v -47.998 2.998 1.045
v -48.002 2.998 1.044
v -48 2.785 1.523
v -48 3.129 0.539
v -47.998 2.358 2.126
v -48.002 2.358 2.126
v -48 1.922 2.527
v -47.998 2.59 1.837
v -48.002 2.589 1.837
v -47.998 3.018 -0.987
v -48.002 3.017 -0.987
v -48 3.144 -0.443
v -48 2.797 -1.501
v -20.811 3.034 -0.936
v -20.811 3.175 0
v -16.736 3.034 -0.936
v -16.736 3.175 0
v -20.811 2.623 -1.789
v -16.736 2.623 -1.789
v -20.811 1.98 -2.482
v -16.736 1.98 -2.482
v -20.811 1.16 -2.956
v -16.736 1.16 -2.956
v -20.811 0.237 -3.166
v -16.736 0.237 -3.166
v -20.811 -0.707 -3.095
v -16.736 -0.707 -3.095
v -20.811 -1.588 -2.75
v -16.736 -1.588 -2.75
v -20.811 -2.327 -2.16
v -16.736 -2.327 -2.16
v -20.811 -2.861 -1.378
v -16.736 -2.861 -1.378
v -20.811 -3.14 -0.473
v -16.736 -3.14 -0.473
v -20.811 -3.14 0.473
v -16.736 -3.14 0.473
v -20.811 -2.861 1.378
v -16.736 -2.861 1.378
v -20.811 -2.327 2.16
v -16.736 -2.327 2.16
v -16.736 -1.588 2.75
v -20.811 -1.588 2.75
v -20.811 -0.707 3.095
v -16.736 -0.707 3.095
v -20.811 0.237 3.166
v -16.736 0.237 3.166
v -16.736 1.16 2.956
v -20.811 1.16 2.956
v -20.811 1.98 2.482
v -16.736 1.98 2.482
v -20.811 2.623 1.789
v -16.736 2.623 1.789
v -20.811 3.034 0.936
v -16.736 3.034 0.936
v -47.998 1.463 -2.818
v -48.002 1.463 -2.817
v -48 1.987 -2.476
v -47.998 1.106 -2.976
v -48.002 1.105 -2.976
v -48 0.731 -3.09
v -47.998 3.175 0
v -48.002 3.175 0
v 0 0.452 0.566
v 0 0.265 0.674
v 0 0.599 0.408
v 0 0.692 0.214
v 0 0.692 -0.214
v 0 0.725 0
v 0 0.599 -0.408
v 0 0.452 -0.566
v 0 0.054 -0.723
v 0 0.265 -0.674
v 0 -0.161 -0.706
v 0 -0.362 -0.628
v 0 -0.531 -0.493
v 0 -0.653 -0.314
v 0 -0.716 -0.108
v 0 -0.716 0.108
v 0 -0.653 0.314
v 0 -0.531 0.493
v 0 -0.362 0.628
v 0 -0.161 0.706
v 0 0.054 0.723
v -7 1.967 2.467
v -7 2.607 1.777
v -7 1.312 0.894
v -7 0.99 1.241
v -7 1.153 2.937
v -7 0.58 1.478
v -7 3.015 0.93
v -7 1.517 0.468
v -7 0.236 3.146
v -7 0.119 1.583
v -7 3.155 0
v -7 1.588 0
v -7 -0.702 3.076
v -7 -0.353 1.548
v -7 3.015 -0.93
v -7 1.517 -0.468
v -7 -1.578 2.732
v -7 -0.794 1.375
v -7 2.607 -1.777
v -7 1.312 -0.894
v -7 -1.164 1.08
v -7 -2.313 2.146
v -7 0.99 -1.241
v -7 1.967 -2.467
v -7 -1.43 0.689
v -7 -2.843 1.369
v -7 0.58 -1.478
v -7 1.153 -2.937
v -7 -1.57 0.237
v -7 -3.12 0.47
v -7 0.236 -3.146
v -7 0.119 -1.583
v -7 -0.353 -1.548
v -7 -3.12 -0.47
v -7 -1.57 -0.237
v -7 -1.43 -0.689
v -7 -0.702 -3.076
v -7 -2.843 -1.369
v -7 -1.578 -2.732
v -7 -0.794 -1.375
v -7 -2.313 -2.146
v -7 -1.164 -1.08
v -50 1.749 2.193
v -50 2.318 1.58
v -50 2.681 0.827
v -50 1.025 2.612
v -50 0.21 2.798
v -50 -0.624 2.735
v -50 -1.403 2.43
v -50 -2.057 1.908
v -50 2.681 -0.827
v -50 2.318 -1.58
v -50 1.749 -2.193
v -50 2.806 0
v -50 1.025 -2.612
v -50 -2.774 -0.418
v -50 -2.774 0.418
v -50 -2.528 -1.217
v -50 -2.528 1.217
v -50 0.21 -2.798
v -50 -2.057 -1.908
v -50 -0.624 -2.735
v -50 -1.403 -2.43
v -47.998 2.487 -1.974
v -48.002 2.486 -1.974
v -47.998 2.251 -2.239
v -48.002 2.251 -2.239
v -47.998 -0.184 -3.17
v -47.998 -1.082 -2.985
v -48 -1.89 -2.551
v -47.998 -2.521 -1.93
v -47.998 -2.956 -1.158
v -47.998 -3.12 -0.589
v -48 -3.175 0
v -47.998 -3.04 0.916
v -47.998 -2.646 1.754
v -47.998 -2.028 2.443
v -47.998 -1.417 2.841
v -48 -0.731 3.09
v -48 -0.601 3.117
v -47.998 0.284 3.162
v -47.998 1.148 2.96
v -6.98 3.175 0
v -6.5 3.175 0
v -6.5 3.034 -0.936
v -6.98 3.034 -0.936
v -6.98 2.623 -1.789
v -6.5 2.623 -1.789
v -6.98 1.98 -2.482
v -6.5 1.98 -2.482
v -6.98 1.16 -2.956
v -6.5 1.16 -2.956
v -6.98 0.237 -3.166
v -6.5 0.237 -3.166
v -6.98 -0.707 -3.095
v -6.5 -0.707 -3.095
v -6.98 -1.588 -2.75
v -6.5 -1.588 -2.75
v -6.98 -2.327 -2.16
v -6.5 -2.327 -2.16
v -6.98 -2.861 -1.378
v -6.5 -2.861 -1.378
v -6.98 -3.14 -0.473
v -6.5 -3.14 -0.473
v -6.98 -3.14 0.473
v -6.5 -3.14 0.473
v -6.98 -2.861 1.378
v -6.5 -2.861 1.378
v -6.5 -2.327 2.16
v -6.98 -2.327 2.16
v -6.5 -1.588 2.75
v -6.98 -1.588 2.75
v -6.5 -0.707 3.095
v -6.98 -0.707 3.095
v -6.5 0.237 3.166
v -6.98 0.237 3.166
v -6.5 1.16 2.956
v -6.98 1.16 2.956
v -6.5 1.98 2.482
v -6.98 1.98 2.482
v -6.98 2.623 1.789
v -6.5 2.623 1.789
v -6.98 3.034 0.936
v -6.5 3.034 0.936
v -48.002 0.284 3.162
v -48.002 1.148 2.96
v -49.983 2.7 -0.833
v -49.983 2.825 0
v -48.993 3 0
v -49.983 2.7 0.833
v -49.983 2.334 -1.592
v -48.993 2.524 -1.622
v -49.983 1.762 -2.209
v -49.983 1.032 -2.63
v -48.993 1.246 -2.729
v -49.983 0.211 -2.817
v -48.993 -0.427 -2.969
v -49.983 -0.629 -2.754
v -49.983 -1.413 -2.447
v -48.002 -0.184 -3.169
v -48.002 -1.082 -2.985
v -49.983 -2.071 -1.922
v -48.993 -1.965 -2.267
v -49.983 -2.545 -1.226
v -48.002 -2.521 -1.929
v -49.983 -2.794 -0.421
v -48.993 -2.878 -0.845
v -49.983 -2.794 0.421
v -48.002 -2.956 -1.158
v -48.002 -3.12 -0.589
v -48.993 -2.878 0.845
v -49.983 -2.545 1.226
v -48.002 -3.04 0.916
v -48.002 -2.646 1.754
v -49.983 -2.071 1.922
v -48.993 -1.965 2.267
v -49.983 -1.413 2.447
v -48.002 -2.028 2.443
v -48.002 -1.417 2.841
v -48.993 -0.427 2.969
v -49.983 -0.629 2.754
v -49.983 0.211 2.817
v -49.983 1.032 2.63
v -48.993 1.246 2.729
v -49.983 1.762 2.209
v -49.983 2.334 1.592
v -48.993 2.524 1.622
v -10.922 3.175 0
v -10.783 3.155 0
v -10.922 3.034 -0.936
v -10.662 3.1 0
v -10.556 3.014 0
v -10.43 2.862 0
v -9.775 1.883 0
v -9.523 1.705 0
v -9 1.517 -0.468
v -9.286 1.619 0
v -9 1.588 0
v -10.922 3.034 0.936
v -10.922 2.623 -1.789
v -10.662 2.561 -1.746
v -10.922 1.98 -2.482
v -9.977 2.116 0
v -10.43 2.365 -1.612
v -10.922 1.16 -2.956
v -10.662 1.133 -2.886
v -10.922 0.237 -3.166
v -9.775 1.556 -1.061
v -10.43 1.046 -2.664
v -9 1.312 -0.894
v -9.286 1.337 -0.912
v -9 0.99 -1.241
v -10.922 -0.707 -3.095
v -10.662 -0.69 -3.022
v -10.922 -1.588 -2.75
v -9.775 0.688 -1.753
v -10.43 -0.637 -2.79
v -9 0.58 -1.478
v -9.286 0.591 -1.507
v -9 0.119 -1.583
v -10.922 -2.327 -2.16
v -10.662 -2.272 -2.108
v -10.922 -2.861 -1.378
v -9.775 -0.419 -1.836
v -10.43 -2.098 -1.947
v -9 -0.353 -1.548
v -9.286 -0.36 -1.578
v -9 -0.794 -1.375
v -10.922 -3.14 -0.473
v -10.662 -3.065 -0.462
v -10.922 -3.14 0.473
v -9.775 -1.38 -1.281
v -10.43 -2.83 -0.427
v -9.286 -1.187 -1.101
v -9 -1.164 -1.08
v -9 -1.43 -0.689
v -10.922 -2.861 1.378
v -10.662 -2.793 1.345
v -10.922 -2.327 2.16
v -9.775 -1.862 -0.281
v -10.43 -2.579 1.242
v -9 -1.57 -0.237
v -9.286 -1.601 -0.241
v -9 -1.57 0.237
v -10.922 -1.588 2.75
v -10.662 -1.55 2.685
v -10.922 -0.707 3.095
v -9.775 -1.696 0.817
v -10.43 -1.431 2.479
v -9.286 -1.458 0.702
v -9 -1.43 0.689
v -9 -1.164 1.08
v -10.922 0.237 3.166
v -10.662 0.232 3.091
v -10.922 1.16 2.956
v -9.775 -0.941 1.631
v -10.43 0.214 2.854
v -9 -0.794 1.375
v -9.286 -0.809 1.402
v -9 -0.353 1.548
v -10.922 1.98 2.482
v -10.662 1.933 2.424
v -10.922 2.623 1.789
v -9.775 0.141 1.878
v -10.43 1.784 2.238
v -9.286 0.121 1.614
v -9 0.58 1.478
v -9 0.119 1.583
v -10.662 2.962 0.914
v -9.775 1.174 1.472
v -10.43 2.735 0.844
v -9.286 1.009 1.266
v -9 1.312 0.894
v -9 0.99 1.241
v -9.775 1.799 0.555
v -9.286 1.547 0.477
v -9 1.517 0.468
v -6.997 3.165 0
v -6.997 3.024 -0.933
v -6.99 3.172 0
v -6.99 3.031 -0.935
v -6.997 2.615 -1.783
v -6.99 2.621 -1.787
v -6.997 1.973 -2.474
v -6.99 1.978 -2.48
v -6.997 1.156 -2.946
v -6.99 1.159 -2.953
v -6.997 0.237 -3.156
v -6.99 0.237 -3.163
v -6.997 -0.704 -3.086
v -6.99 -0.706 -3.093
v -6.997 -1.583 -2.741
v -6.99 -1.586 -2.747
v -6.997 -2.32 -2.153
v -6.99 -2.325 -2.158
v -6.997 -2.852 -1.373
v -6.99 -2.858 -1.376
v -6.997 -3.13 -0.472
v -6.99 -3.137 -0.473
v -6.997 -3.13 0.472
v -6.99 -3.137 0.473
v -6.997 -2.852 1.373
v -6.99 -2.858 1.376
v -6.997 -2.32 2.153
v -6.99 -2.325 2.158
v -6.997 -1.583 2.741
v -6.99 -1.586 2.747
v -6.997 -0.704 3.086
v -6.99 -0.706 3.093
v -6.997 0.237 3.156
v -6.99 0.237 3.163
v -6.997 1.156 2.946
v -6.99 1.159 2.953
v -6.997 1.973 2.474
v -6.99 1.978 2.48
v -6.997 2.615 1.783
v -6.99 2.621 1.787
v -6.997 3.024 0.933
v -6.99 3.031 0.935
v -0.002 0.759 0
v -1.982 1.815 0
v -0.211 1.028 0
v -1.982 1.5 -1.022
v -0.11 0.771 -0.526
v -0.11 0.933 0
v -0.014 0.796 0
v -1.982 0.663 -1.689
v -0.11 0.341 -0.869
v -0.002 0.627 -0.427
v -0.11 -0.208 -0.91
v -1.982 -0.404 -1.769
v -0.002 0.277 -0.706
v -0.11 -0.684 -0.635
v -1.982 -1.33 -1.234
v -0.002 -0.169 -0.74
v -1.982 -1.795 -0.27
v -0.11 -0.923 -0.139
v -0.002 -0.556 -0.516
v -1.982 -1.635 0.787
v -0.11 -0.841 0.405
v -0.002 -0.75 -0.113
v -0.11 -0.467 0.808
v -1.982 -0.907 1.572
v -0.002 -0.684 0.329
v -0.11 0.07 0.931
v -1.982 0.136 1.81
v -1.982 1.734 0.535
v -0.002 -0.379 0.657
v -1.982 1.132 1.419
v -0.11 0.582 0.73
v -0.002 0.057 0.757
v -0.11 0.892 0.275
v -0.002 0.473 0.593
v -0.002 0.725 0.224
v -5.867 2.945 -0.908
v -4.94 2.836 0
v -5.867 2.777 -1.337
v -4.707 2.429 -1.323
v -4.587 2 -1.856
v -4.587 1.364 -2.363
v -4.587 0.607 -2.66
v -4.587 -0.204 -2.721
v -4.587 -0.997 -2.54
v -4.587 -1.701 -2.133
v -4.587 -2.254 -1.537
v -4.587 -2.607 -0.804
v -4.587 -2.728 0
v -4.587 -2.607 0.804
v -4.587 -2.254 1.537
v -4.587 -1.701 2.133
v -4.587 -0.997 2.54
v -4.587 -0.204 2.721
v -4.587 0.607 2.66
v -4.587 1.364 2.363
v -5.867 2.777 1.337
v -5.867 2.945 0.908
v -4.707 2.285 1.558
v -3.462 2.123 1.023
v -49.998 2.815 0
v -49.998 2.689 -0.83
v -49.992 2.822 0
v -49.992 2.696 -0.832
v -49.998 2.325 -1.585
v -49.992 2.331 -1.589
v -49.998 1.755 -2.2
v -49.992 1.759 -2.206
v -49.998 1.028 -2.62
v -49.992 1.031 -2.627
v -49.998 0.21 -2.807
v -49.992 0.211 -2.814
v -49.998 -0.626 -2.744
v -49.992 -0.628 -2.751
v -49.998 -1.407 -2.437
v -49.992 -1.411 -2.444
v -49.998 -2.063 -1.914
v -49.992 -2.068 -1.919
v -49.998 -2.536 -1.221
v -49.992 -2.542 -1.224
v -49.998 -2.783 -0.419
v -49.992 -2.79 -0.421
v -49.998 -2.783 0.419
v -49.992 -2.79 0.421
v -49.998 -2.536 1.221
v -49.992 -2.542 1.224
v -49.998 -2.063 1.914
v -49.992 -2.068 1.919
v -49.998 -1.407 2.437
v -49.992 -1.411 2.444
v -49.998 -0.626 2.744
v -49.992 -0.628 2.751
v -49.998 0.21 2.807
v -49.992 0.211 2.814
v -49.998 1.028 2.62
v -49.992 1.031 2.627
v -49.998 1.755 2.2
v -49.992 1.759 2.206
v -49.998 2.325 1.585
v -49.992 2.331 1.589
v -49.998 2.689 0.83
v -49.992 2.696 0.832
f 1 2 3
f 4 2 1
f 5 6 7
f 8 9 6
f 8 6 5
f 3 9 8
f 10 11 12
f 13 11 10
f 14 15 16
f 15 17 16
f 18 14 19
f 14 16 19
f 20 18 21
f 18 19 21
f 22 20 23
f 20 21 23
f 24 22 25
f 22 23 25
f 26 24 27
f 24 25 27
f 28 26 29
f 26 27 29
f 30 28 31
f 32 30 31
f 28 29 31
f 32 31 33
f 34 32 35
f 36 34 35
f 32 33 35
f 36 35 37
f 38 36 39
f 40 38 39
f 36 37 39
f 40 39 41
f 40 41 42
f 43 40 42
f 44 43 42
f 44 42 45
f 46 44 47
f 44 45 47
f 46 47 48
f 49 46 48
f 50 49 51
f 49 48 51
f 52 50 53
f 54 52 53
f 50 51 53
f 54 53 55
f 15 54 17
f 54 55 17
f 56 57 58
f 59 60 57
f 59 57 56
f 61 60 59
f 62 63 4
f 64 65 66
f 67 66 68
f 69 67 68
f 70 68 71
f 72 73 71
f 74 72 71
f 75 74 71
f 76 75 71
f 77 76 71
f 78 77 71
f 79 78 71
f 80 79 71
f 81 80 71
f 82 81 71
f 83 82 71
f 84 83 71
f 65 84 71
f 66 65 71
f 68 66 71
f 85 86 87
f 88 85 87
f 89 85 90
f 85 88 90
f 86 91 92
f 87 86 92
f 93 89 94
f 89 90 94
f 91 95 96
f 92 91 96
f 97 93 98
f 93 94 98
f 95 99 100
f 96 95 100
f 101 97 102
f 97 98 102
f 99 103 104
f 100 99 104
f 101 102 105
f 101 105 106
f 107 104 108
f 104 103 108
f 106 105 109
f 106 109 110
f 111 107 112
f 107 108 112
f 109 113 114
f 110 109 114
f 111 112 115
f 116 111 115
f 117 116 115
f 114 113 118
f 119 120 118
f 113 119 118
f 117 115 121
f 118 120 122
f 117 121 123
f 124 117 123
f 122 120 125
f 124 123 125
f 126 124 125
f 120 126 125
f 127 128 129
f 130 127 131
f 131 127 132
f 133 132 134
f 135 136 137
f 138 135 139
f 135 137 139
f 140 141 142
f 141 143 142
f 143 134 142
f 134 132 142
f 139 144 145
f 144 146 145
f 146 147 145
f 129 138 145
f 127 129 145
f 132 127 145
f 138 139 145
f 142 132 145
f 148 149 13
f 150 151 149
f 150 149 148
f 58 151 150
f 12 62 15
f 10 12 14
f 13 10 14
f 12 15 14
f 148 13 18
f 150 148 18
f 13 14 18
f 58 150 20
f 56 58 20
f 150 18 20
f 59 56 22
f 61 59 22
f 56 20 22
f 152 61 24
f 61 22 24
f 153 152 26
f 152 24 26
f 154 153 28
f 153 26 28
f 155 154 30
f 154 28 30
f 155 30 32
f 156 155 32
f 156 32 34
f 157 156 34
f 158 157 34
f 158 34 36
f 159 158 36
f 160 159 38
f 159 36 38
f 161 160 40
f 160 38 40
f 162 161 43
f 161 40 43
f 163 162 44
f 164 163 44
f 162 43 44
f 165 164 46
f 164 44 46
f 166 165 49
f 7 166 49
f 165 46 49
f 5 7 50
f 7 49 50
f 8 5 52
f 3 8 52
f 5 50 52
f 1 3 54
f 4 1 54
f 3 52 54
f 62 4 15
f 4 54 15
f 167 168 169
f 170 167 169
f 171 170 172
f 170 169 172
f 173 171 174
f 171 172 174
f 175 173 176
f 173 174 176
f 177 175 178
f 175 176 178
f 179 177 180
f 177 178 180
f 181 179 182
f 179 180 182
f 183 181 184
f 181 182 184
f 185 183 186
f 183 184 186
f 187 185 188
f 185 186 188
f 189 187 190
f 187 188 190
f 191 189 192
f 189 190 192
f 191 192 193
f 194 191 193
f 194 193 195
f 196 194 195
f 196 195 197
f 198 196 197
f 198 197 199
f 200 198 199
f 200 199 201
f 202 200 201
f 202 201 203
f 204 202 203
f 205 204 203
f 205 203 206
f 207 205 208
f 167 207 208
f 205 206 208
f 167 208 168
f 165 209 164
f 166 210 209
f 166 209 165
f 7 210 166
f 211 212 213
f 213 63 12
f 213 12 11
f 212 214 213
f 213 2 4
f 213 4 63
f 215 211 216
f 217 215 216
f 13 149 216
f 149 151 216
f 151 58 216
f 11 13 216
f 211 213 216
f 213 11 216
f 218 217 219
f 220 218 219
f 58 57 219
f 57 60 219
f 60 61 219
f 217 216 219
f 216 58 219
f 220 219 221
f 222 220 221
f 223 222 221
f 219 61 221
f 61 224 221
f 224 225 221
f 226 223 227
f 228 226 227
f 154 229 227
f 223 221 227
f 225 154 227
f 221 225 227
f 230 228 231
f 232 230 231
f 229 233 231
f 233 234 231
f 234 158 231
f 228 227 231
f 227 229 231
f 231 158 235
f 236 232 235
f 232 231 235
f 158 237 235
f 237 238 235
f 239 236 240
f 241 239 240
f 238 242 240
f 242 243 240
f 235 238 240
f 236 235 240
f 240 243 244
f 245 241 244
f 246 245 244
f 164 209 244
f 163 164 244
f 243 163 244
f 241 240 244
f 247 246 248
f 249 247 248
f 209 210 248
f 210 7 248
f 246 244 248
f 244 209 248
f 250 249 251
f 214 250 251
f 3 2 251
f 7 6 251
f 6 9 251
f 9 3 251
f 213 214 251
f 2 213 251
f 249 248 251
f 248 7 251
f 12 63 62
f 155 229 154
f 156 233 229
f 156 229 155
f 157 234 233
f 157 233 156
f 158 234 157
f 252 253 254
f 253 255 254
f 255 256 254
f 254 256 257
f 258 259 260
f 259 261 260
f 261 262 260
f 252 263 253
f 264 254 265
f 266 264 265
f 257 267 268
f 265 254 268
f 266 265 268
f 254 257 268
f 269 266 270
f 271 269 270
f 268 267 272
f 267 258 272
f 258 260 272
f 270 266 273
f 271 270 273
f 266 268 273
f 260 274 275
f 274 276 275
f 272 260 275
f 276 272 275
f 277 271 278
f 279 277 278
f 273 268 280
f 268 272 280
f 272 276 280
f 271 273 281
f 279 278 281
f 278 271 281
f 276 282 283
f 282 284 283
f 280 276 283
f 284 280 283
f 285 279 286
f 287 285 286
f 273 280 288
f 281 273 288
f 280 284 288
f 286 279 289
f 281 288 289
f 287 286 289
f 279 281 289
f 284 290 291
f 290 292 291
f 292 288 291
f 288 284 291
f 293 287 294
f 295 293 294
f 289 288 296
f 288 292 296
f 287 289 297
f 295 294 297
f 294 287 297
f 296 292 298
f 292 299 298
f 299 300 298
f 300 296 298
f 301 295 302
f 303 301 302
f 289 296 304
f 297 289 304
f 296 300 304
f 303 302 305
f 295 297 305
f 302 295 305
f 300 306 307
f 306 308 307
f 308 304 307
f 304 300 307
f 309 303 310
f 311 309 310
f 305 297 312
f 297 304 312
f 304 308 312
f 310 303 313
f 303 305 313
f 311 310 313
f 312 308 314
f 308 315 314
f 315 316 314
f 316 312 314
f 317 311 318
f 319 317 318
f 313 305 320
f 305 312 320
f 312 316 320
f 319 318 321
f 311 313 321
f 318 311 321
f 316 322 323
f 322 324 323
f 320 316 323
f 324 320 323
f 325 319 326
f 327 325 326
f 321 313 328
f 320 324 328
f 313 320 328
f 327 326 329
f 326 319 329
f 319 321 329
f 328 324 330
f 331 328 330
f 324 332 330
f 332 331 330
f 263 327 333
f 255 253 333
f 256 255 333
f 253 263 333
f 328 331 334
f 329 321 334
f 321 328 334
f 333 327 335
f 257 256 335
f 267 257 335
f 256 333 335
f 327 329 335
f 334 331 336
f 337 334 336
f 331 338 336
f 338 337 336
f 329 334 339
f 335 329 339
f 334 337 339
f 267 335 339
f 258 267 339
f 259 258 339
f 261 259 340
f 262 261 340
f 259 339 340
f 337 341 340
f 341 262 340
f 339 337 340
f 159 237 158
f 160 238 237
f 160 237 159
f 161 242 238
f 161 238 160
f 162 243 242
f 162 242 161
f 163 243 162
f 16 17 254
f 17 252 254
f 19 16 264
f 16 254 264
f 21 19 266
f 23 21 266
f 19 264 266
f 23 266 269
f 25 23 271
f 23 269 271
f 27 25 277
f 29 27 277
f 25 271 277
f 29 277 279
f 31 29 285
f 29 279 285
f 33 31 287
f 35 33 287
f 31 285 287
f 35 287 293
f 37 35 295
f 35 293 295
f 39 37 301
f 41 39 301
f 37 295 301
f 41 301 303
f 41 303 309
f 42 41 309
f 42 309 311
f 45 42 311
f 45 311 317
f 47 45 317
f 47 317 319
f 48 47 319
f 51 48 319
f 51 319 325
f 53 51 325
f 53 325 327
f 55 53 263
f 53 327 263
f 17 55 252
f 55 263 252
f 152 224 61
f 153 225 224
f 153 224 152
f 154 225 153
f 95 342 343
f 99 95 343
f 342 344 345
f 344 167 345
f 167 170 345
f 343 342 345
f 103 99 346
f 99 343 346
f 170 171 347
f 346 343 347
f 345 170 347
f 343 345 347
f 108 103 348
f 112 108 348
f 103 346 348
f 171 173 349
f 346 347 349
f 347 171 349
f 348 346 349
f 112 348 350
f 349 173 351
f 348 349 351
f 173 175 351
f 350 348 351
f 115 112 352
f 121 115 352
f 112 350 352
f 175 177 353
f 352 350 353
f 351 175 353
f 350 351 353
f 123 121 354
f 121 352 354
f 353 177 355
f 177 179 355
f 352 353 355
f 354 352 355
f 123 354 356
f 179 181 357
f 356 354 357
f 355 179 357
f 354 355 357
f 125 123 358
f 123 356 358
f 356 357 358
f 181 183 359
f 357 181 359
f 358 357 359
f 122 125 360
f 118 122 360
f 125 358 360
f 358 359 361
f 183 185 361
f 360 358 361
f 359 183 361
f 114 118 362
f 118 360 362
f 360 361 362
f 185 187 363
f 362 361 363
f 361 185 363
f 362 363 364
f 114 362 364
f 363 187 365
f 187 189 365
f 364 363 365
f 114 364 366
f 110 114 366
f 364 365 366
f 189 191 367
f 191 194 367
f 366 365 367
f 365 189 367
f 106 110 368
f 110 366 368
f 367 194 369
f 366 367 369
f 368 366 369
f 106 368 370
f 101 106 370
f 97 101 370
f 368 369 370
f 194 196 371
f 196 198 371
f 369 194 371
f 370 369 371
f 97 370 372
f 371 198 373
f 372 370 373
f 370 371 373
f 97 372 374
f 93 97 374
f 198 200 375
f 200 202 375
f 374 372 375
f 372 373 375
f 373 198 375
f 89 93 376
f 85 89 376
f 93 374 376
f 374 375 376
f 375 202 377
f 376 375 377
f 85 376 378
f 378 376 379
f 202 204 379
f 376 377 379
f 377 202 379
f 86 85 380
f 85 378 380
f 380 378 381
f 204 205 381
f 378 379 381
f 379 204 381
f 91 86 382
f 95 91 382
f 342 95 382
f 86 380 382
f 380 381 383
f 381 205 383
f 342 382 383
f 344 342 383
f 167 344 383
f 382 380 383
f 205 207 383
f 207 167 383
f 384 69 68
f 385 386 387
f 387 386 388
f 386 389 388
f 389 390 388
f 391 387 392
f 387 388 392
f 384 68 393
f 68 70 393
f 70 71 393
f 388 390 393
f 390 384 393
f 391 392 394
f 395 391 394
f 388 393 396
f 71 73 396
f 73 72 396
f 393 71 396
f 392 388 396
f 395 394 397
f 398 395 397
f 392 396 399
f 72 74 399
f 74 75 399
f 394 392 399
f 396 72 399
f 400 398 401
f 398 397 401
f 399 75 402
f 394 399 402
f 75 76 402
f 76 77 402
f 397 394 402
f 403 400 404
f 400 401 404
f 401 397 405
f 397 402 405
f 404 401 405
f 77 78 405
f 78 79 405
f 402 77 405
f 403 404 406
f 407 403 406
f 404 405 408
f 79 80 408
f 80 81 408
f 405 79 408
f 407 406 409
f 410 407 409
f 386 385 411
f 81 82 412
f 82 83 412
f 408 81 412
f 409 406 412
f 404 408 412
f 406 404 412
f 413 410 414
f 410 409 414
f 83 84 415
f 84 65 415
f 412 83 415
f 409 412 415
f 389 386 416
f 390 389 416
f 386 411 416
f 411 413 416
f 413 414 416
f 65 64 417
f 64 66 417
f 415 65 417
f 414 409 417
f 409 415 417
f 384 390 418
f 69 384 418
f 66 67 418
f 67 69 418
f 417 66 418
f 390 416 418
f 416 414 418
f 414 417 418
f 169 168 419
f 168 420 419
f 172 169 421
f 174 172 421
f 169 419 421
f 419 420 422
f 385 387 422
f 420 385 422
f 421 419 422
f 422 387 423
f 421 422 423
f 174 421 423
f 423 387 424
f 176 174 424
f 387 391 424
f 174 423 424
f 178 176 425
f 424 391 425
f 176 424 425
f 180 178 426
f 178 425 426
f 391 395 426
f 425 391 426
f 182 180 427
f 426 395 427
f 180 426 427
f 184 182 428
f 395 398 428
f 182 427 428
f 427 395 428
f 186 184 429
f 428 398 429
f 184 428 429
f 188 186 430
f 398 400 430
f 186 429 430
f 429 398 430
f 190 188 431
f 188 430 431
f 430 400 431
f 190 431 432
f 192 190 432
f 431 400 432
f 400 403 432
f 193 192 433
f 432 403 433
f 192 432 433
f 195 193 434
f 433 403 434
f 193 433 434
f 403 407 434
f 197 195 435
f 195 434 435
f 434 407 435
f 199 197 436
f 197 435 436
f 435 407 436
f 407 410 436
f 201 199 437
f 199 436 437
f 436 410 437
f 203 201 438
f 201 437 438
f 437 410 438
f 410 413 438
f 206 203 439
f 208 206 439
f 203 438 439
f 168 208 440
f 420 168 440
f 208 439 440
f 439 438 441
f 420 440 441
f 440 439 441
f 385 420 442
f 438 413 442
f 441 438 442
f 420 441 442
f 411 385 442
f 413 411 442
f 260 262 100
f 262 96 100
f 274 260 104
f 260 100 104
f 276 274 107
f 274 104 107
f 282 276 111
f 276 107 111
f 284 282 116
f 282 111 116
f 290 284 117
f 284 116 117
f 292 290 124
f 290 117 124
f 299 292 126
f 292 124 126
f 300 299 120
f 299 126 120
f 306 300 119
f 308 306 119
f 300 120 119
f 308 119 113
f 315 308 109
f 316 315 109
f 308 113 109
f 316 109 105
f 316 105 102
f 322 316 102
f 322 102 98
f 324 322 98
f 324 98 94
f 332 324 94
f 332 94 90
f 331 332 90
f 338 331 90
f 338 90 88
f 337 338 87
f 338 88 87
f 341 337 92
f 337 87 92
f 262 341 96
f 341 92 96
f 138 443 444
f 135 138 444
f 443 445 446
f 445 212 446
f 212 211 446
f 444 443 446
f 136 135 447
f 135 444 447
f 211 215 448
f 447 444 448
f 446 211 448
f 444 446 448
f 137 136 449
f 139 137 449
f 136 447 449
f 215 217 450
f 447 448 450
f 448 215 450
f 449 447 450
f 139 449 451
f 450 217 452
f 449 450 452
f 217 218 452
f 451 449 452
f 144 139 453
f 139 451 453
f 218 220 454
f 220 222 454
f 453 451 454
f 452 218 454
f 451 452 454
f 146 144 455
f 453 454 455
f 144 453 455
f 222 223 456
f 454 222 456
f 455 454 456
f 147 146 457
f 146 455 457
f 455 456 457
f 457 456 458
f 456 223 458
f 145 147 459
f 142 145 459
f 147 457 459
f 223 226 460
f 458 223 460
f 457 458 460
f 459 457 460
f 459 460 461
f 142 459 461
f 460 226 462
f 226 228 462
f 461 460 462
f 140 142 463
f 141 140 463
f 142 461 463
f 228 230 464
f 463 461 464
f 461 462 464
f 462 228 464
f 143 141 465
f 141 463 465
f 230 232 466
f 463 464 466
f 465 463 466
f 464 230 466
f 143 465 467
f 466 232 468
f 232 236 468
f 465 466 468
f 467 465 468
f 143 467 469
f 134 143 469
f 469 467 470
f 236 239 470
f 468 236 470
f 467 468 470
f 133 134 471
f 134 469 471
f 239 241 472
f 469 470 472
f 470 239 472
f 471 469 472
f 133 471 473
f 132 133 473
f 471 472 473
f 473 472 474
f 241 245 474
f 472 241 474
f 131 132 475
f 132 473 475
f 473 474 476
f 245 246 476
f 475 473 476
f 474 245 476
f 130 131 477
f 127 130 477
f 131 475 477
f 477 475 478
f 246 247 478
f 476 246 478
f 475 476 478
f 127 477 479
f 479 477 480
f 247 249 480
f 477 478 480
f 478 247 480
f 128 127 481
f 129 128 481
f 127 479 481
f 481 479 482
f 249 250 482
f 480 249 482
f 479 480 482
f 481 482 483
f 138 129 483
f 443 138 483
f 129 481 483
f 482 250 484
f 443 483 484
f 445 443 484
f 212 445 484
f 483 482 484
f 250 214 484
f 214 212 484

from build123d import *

# Parameters (mm, degrees)
BREAK_EDGES_R = 0.02


with BuildPart() as part:
    # body_sketch → body (revolve)
    with BuildSketch(Plane.XY):
        with BuildLine():
            Line((-16.73571407, 3.175), (-10.921788615, 3.175))
            add(Edge.make_bspline(
                [(-10.921788615, 3.175), (-10.165447426, 3.175), (-10.250040485, 1.5875), (-9, 1.5875)],
                knots=[0, 0, 0, 0, 1, 1, 1, 1], degree=3))
            Line((-9, 1.5875), (-7, 1.5875))
            Line((-7, 1.5875), (-7, 3.175))
            Line((-7, 3.175), (-6.5, 3.175))
            add(Edge.make_bspline(
                [(-6.5, 3.175), (-5.484084378, 3.175), (-0.421041724, 1.302274259), (-0.009654297, 0.817143972), (0, 0.774017781), (0, 0.724579725)],
                knots=[0, 0, 0, 0, 0.586137631, 0.686137631, 1, 1, 1, 1], degree=3))
            Line((0, 0.724579725), (0, 0))
            Line((0, 0), (-50, 0))
            Line((-50, 0), (-50, 2.822346039))
            Line((-50, 2.822346039), (-48, 3.175))
            Line((-48, 3.175), (-20.811079947, 3.175))
            add(Edge.make_bspline(
                [(-20.811079947, 3.175), (-19.383200887, 3.175), (-18.073641119, 3.175), (-16.73571407, 3.175)],
                knots=[0, 0, 0, 0, 1, 1, 1, 1], degree=3))
        make_face()
    revolve(axis=Axis((0, 0, 0), (-1, 0, 0)))

    # break_edges
    break_edges_edges = [part.edges().sort_by_distance(p)[0] for p in [
        (-7, -3.175, 0),
        (-50, -2.822346039, 0),
        (-48, -3.175, 0),
    ]]
    fillet(break_edges_edges, radius=BREAK_EDGES_R)


solid = part.part
